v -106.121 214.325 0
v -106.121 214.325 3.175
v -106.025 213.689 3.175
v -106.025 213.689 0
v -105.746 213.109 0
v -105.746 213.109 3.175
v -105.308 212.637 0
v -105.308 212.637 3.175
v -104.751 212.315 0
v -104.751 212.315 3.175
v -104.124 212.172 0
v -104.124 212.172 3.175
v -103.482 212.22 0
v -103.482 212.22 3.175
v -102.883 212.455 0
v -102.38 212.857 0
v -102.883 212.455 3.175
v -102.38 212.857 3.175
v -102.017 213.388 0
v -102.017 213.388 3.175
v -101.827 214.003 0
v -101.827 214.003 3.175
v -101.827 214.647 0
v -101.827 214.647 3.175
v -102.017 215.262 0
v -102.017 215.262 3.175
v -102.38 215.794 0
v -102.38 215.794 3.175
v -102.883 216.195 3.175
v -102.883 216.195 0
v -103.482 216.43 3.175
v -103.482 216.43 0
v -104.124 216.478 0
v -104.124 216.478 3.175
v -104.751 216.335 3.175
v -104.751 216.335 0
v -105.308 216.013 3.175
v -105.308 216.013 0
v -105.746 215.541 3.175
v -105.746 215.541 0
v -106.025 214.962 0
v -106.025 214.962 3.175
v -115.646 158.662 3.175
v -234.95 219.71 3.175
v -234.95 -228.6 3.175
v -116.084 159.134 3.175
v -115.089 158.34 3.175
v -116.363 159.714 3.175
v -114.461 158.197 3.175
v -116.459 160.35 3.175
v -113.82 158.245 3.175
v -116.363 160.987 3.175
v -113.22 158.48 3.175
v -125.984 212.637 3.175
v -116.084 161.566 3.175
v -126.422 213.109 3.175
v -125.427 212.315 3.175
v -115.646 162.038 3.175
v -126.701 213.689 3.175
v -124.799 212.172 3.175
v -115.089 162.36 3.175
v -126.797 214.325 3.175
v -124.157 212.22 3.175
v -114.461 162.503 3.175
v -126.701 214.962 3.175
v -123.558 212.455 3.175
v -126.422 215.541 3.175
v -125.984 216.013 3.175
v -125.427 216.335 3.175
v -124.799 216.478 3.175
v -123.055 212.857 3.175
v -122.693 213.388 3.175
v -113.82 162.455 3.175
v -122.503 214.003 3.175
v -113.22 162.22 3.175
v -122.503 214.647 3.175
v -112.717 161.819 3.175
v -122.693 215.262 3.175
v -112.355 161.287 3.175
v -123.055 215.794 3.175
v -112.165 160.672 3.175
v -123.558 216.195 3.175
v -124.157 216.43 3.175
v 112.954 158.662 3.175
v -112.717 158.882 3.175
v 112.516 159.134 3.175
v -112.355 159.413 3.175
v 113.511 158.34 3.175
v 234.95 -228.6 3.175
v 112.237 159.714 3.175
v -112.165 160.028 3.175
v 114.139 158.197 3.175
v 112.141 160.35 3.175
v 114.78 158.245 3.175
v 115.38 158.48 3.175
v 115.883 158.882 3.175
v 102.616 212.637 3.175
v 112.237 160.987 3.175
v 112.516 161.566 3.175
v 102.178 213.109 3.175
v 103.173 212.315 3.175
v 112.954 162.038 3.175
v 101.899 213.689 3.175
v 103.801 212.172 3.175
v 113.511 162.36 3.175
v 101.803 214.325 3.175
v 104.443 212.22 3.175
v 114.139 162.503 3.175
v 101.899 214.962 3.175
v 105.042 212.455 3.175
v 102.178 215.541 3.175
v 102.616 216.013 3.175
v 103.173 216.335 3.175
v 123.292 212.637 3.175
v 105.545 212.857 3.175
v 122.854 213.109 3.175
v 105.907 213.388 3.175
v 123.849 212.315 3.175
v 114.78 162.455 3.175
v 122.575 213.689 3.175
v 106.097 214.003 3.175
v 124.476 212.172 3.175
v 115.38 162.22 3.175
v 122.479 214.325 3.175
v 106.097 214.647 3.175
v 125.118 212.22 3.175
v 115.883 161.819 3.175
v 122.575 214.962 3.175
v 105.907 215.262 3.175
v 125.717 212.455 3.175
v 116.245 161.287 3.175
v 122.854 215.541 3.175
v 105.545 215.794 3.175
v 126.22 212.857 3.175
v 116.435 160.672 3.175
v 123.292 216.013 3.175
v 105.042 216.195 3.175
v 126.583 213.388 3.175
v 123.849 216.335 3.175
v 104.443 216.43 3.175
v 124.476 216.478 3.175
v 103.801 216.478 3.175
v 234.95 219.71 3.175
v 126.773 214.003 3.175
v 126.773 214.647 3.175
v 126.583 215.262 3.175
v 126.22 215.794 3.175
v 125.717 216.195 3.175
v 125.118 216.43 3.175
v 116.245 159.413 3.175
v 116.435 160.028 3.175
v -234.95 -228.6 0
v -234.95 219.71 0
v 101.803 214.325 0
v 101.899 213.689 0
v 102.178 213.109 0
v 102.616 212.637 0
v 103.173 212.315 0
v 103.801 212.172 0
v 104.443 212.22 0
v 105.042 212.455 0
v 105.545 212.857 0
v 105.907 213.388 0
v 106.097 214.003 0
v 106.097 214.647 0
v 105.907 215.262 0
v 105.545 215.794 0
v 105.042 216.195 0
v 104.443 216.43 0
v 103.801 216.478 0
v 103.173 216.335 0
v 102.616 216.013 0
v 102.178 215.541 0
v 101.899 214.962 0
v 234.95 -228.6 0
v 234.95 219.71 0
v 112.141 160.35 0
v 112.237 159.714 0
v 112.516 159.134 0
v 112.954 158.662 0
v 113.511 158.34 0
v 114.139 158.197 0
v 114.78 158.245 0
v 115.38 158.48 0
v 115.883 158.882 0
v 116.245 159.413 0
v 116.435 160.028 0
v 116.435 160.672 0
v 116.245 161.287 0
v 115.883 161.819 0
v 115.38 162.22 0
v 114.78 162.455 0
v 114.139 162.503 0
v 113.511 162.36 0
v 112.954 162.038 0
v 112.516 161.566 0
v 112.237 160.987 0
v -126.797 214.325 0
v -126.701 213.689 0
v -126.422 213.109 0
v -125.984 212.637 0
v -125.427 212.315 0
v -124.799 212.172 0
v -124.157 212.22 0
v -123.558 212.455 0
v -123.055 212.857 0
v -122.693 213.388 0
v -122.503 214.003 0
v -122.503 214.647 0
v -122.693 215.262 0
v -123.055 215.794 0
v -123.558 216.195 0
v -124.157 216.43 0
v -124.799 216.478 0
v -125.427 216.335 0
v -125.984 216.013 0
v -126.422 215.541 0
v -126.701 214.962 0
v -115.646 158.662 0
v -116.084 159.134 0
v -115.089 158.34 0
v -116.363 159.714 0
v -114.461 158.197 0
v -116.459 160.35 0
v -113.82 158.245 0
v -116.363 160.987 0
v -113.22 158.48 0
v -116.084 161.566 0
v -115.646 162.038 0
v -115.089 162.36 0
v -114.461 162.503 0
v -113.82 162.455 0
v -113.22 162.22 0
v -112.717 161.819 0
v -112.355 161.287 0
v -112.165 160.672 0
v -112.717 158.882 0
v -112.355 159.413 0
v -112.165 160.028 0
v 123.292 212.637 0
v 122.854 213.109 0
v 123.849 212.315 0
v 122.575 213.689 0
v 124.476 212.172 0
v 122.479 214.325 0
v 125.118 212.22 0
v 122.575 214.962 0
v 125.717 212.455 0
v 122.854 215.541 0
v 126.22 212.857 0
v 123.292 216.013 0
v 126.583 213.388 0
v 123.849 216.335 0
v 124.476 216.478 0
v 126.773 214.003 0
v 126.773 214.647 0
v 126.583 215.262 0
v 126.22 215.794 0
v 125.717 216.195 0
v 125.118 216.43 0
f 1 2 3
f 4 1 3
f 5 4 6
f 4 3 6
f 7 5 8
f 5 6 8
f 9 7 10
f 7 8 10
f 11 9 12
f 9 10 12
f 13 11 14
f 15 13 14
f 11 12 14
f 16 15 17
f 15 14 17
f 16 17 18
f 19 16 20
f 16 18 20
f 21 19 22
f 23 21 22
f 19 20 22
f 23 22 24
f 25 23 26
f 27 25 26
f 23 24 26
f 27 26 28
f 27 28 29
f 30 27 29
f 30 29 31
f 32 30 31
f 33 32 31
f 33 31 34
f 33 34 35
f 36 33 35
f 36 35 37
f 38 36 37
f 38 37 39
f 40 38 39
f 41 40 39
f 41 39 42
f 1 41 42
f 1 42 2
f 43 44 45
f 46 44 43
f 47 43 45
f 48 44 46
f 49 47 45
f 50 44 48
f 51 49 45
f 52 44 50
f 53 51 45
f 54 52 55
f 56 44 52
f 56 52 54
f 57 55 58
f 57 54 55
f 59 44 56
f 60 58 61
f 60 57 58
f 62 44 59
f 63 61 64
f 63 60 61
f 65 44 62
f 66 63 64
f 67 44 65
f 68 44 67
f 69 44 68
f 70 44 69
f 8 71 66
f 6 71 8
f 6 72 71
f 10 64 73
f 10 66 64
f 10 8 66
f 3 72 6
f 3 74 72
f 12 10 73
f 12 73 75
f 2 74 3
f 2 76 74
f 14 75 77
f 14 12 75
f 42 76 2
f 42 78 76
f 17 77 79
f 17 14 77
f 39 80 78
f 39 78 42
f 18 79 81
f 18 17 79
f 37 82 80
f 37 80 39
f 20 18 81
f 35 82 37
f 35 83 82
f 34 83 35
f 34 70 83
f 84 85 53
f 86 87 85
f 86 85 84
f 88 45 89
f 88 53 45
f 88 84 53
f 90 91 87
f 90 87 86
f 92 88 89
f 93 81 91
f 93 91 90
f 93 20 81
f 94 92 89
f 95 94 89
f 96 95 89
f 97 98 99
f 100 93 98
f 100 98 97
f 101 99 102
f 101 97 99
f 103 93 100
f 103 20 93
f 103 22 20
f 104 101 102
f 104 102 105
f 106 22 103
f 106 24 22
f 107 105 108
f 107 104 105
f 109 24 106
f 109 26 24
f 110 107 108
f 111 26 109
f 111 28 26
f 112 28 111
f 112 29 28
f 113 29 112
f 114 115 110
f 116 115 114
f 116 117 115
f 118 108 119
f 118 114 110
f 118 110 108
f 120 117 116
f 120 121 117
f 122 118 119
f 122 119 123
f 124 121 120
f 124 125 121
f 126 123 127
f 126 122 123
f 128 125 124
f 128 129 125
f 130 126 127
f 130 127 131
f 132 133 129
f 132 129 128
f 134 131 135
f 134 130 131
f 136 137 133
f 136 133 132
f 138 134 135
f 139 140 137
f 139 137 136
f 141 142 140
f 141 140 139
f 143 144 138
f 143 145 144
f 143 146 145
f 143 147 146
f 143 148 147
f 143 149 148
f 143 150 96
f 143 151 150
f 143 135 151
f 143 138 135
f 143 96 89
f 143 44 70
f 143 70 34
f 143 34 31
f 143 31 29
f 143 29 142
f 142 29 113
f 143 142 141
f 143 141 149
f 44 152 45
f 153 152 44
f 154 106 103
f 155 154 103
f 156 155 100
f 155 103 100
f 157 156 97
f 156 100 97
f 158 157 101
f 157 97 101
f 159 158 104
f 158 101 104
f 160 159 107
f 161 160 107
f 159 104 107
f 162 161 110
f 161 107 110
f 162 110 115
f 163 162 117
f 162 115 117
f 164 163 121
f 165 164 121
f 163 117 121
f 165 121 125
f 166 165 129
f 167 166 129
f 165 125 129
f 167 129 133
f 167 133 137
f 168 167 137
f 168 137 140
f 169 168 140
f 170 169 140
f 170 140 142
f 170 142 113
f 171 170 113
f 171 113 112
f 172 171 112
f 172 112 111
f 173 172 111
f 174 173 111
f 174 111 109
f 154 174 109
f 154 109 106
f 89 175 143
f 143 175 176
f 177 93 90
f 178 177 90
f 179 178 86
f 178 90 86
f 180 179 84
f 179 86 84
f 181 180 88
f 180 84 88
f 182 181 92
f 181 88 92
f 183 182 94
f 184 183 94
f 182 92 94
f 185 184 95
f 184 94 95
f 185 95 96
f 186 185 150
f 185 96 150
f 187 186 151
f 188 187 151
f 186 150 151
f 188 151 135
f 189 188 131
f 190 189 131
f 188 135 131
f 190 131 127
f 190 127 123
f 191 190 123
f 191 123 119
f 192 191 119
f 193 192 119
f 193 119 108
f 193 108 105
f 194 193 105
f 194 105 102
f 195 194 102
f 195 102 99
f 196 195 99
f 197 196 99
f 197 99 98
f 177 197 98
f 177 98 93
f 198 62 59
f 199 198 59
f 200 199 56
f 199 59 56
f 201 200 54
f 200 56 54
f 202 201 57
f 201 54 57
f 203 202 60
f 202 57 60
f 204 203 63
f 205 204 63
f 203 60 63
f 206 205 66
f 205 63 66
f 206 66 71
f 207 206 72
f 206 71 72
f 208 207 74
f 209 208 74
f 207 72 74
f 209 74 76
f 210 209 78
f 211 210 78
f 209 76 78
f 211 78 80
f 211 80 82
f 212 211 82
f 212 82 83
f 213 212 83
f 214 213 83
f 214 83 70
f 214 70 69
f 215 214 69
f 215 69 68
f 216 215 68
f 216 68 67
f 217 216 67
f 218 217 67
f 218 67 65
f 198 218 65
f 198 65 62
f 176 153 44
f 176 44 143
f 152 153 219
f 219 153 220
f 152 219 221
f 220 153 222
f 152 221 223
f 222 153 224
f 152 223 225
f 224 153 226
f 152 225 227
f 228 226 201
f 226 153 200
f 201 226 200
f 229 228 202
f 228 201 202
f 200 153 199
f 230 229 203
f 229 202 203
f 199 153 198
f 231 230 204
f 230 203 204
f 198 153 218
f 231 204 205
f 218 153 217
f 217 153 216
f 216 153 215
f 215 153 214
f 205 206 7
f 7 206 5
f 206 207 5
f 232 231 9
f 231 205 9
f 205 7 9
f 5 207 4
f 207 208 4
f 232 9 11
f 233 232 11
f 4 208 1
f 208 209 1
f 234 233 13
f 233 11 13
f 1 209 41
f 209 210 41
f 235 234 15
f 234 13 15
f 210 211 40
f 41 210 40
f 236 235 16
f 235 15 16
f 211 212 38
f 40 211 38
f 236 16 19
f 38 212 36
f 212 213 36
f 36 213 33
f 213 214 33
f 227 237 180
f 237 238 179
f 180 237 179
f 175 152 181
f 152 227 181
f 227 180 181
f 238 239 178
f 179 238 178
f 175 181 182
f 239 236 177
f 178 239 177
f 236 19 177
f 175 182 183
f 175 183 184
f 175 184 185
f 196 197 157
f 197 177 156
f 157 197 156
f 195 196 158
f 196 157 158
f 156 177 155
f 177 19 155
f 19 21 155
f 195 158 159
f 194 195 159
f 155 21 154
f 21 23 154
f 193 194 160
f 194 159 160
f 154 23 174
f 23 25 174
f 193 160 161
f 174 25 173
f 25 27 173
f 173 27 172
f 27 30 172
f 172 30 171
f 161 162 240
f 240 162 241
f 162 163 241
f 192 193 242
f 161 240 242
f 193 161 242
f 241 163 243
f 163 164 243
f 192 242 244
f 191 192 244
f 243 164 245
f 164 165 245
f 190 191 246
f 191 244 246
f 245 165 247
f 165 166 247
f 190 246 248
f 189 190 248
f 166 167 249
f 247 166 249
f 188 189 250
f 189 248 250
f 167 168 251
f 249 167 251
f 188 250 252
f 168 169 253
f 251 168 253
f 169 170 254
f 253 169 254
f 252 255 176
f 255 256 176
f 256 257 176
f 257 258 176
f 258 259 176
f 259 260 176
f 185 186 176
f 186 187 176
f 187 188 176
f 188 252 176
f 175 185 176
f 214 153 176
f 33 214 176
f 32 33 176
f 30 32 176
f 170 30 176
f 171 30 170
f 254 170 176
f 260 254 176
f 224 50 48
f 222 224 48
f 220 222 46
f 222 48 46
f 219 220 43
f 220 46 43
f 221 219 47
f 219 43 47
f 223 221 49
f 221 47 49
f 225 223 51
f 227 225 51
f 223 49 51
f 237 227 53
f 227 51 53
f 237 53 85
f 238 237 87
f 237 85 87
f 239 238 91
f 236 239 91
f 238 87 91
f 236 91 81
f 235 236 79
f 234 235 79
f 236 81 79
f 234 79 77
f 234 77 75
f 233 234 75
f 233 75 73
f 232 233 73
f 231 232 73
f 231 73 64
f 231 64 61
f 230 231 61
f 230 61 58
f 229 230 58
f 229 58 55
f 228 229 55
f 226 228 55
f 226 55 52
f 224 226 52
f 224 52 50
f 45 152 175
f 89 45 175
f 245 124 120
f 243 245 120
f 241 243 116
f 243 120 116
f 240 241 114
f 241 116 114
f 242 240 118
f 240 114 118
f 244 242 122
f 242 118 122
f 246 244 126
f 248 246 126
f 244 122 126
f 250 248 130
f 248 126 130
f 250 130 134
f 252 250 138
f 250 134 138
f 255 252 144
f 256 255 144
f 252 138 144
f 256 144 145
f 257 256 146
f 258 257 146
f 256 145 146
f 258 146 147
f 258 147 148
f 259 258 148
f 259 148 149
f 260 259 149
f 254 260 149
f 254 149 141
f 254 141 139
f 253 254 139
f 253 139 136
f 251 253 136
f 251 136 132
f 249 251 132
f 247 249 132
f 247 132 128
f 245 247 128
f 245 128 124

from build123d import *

# Parameters (mm, degrees)
F0_W     = 469.9
F0_H     = 469.9
F1_DEPTH = 3.175
F3_D     = 4.318
F4_DEPTH = 15.24
F5_DEPTH = 6.35


with BuildPart() as f1:
    # F0 (on Top) → F1 (new body)
    with BuildSketch(Plane.XY):
        Rectangle(F0_W, F0_H)
    extrude(amount=F1_DEPTH)

    # F3 (through all)
    with Locations(Plane(origin=(0, 0, 0), x_dir=(1, 0, 0), z_dir=(0, 0, -1))):
        with Locations((124.6378, -214.3252), (103.9622, -214.3252), (114.3, -160.3502), (-114.3, -160.3502), (-103.9622, -214.3252), (-124.6378, -214.3252)):
            Hole(F3_D / 2)

    # F4 (cut): a face of the model
    f4_faces = [f1.faces().sort_by_distance(p)[0] for p in [
        (0, 234.95, 1.5875),
    ]]
    extrude(f4_faces, amount=-F4_DEPTH, mode=Mode.SUBTRACT)

    # F5 (cut): a face of the model
    f5_faces = [f1.faces().sort_by_distance(p)[0] for p in [
        (0, -234.95, 1.5875),
    ]]
    extrude(f5_faces, amount=-F5_DEPTH, mode=Mode.SUBTRACT)


solid = f1.part
